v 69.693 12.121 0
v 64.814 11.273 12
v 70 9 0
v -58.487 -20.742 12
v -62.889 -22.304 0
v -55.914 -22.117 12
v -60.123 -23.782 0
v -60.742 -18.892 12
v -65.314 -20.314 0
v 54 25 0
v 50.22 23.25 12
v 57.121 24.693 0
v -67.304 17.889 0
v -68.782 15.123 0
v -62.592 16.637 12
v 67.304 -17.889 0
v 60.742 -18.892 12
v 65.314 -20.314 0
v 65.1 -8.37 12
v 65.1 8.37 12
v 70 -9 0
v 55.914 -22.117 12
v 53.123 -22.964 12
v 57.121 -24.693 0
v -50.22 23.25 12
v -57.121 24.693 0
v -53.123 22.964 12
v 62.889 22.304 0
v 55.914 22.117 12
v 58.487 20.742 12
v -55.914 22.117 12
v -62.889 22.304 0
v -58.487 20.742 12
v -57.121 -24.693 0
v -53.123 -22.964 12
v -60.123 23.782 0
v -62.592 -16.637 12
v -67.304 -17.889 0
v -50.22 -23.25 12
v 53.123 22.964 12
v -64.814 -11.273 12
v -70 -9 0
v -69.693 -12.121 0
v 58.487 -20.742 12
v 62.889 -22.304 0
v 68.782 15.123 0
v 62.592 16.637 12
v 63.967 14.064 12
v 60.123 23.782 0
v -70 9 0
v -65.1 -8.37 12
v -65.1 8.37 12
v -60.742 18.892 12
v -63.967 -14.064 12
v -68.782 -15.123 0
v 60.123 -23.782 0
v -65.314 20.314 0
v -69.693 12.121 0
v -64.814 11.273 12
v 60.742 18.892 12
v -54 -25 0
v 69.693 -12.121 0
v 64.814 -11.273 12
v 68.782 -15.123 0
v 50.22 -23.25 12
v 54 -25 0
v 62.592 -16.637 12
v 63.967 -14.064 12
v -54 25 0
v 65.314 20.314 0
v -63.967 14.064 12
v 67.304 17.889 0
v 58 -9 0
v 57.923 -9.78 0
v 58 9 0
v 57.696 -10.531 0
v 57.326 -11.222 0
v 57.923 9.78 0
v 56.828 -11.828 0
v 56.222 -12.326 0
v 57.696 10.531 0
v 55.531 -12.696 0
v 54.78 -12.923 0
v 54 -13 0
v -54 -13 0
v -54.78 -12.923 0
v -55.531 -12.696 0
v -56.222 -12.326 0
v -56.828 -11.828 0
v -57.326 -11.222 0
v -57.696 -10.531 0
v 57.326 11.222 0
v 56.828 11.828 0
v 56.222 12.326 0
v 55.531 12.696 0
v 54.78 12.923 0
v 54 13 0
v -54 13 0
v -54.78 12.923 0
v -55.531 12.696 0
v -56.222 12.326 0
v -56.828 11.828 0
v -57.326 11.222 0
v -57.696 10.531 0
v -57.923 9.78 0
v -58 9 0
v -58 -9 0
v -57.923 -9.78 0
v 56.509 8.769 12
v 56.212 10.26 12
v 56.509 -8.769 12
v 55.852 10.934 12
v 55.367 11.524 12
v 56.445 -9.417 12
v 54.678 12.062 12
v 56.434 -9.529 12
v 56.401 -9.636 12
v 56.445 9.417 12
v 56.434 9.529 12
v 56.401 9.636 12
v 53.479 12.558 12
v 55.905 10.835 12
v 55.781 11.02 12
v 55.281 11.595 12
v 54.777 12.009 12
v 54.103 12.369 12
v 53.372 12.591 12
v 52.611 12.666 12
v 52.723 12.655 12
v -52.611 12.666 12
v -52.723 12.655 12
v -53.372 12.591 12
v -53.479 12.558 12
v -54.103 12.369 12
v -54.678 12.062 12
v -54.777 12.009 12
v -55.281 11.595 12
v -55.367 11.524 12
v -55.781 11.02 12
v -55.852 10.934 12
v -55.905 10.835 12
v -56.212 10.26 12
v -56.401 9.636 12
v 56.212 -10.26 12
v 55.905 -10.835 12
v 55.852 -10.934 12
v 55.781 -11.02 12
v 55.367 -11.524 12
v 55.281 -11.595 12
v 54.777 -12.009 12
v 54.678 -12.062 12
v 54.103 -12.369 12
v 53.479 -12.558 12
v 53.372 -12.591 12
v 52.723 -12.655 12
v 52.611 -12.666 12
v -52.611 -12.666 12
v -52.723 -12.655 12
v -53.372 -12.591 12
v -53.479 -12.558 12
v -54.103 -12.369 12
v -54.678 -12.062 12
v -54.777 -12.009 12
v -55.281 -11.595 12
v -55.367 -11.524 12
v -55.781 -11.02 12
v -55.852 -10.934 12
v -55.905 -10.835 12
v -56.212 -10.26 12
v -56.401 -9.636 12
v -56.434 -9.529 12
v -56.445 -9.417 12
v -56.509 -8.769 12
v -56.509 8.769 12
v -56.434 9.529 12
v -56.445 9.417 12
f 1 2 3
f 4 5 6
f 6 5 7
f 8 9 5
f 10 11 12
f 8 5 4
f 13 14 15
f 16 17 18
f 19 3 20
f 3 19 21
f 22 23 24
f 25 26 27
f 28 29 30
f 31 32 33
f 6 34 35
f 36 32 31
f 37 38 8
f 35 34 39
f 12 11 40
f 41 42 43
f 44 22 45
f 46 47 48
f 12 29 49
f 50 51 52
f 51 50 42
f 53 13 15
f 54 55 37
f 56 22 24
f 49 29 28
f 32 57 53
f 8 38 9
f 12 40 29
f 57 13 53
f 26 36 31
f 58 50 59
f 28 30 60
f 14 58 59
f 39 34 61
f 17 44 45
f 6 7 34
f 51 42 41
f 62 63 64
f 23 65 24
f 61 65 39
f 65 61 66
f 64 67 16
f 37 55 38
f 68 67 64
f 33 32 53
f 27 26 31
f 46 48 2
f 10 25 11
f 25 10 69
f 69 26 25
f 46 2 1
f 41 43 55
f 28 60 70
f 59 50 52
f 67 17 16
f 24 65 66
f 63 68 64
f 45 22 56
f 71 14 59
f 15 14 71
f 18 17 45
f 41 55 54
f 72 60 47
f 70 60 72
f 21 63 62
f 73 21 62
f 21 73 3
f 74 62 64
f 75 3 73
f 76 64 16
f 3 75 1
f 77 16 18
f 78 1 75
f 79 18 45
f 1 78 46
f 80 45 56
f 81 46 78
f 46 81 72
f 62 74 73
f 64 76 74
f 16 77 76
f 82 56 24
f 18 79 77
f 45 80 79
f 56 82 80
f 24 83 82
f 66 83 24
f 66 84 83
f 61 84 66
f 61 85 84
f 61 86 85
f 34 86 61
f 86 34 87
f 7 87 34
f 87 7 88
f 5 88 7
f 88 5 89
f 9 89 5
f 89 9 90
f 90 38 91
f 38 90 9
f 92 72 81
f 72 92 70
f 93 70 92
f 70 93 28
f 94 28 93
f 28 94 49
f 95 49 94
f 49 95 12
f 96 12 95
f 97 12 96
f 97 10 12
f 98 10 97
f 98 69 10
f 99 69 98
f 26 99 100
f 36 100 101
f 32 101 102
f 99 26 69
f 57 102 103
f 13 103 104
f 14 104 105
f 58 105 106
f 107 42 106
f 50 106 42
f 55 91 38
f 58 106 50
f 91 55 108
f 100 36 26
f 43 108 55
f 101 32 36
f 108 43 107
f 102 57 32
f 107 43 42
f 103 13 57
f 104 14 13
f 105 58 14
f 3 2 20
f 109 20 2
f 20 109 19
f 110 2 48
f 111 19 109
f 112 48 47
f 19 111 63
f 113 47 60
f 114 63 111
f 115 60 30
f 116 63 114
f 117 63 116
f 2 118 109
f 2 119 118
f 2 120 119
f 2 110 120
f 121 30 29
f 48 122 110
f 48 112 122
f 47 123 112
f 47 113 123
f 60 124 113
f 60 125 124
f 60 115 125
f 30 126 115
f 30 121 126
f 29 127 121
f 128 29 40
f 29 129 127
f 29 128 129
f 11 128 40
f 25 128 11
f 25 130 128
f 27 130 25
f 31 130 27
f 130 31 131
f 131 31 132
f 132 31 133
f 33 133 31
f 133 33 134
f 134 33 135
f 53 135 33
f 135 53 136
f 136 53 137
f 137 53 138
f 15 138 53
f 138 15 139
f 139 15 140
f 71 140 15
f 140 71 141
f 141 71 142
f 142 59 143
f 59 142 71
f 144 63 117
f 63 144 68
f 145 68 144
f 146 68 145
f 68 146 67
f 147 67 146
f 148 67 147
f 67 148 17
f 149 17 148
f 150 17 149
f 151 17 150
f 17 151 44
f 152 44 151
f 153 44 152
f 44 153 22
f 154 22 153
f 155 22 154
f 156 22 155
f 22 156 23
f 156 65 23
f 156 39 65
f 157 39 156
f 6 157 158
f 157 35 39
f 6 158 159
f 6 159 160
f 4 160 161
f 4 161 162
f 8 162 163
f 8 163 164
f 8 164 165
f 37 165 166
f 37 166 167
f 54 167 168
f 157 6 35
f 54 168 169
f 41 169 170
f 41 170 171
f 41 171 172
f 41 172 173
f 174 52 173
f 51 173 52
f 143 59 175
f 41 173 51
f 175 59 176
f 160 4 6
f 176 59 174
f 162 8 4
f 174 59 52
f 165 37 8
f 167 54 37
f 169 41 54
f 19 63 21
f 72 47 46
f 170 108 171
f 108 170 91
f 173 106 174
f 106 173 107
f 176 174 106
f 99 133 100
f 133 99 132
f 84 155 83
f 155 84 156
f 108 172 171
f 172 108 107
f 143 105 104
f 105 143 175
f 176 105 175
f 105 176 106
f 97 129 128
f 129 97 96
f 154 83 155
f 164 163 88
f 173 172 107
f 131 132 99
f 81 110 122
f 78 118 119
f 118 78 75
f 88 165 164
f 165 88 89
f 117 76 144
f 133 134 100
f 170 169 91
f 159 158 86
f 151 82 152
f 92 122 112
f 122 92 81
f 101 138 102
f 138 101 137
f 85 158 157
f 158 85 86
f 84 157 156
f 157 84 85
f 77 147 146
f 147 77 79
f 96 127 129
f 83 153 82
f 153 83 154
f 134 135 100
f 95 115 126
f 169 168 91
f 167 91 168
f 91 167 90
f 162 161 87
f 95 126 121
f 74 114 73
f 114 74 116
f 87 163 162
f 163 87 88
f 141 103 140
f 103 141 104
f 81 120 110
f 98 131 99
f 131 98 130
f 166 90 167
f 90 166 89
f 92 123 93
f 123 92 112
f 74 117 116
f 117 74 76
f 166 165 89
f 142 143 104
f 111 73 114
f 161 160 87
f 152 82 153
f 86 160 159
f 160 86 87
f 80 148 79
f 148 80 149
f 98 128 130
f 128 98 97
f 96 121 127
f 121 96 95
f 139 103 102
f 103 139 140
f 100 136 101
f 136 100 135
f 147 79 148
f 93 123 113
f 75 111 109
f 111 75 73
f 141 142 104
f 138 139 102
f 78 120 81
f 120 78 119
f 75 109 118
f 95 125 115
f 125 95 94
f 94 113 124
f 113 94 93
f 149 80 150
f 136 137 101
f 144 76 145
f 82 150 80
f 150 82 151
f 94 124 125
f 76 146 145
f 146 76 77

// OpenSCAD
$fn = 32;

// ----------------------------------------------------------------------
// Display bezel: 140 x 50 mm frame, opening 116x26 mm
// ----------------------------------------------------------------------

// --- parameters (mm) ---
length = 140;             // frame outside length, X
width = 50;               // frame outside width, Y
frame_w = 12;             // frame width
thickness = 12;           // frame thickness
corner_r = 16;            // outside corner radius
chamfer = 0.93;           // outer wall taper
funnel = 0.97;            // inner opening taper
opening_l = 116;          // opening length
opening_w = 26;           // opening width
inner_r = 4;              // opening corner radius

/* rounded-rectangle outlines, generated with loops */
module rounded_ring(l_nom, w_nom, r) {
  hull() {
    for (sx = [-1, 1]) for (sy = [-1, 1])
      translate([sx * (l_nom / 2 - r), sy * (w_nom / 2 - r)]) circle(r = r);
  }
}

difference() {
  /* frame body, drafted so the outer edge is a variable-depth chamfer */
  linear_extrude(height = thickness, scale = chamfer)
    rounded_ring(length, width, corner_r);
  /* viewing opening, drafted the other way for a funnel edge */
  linear_extrude(height = thickness + 2, scale = funnel)
    translate([0, 0, -1]) rounded_ring(opening_l, opening_w, inner_r);
}
